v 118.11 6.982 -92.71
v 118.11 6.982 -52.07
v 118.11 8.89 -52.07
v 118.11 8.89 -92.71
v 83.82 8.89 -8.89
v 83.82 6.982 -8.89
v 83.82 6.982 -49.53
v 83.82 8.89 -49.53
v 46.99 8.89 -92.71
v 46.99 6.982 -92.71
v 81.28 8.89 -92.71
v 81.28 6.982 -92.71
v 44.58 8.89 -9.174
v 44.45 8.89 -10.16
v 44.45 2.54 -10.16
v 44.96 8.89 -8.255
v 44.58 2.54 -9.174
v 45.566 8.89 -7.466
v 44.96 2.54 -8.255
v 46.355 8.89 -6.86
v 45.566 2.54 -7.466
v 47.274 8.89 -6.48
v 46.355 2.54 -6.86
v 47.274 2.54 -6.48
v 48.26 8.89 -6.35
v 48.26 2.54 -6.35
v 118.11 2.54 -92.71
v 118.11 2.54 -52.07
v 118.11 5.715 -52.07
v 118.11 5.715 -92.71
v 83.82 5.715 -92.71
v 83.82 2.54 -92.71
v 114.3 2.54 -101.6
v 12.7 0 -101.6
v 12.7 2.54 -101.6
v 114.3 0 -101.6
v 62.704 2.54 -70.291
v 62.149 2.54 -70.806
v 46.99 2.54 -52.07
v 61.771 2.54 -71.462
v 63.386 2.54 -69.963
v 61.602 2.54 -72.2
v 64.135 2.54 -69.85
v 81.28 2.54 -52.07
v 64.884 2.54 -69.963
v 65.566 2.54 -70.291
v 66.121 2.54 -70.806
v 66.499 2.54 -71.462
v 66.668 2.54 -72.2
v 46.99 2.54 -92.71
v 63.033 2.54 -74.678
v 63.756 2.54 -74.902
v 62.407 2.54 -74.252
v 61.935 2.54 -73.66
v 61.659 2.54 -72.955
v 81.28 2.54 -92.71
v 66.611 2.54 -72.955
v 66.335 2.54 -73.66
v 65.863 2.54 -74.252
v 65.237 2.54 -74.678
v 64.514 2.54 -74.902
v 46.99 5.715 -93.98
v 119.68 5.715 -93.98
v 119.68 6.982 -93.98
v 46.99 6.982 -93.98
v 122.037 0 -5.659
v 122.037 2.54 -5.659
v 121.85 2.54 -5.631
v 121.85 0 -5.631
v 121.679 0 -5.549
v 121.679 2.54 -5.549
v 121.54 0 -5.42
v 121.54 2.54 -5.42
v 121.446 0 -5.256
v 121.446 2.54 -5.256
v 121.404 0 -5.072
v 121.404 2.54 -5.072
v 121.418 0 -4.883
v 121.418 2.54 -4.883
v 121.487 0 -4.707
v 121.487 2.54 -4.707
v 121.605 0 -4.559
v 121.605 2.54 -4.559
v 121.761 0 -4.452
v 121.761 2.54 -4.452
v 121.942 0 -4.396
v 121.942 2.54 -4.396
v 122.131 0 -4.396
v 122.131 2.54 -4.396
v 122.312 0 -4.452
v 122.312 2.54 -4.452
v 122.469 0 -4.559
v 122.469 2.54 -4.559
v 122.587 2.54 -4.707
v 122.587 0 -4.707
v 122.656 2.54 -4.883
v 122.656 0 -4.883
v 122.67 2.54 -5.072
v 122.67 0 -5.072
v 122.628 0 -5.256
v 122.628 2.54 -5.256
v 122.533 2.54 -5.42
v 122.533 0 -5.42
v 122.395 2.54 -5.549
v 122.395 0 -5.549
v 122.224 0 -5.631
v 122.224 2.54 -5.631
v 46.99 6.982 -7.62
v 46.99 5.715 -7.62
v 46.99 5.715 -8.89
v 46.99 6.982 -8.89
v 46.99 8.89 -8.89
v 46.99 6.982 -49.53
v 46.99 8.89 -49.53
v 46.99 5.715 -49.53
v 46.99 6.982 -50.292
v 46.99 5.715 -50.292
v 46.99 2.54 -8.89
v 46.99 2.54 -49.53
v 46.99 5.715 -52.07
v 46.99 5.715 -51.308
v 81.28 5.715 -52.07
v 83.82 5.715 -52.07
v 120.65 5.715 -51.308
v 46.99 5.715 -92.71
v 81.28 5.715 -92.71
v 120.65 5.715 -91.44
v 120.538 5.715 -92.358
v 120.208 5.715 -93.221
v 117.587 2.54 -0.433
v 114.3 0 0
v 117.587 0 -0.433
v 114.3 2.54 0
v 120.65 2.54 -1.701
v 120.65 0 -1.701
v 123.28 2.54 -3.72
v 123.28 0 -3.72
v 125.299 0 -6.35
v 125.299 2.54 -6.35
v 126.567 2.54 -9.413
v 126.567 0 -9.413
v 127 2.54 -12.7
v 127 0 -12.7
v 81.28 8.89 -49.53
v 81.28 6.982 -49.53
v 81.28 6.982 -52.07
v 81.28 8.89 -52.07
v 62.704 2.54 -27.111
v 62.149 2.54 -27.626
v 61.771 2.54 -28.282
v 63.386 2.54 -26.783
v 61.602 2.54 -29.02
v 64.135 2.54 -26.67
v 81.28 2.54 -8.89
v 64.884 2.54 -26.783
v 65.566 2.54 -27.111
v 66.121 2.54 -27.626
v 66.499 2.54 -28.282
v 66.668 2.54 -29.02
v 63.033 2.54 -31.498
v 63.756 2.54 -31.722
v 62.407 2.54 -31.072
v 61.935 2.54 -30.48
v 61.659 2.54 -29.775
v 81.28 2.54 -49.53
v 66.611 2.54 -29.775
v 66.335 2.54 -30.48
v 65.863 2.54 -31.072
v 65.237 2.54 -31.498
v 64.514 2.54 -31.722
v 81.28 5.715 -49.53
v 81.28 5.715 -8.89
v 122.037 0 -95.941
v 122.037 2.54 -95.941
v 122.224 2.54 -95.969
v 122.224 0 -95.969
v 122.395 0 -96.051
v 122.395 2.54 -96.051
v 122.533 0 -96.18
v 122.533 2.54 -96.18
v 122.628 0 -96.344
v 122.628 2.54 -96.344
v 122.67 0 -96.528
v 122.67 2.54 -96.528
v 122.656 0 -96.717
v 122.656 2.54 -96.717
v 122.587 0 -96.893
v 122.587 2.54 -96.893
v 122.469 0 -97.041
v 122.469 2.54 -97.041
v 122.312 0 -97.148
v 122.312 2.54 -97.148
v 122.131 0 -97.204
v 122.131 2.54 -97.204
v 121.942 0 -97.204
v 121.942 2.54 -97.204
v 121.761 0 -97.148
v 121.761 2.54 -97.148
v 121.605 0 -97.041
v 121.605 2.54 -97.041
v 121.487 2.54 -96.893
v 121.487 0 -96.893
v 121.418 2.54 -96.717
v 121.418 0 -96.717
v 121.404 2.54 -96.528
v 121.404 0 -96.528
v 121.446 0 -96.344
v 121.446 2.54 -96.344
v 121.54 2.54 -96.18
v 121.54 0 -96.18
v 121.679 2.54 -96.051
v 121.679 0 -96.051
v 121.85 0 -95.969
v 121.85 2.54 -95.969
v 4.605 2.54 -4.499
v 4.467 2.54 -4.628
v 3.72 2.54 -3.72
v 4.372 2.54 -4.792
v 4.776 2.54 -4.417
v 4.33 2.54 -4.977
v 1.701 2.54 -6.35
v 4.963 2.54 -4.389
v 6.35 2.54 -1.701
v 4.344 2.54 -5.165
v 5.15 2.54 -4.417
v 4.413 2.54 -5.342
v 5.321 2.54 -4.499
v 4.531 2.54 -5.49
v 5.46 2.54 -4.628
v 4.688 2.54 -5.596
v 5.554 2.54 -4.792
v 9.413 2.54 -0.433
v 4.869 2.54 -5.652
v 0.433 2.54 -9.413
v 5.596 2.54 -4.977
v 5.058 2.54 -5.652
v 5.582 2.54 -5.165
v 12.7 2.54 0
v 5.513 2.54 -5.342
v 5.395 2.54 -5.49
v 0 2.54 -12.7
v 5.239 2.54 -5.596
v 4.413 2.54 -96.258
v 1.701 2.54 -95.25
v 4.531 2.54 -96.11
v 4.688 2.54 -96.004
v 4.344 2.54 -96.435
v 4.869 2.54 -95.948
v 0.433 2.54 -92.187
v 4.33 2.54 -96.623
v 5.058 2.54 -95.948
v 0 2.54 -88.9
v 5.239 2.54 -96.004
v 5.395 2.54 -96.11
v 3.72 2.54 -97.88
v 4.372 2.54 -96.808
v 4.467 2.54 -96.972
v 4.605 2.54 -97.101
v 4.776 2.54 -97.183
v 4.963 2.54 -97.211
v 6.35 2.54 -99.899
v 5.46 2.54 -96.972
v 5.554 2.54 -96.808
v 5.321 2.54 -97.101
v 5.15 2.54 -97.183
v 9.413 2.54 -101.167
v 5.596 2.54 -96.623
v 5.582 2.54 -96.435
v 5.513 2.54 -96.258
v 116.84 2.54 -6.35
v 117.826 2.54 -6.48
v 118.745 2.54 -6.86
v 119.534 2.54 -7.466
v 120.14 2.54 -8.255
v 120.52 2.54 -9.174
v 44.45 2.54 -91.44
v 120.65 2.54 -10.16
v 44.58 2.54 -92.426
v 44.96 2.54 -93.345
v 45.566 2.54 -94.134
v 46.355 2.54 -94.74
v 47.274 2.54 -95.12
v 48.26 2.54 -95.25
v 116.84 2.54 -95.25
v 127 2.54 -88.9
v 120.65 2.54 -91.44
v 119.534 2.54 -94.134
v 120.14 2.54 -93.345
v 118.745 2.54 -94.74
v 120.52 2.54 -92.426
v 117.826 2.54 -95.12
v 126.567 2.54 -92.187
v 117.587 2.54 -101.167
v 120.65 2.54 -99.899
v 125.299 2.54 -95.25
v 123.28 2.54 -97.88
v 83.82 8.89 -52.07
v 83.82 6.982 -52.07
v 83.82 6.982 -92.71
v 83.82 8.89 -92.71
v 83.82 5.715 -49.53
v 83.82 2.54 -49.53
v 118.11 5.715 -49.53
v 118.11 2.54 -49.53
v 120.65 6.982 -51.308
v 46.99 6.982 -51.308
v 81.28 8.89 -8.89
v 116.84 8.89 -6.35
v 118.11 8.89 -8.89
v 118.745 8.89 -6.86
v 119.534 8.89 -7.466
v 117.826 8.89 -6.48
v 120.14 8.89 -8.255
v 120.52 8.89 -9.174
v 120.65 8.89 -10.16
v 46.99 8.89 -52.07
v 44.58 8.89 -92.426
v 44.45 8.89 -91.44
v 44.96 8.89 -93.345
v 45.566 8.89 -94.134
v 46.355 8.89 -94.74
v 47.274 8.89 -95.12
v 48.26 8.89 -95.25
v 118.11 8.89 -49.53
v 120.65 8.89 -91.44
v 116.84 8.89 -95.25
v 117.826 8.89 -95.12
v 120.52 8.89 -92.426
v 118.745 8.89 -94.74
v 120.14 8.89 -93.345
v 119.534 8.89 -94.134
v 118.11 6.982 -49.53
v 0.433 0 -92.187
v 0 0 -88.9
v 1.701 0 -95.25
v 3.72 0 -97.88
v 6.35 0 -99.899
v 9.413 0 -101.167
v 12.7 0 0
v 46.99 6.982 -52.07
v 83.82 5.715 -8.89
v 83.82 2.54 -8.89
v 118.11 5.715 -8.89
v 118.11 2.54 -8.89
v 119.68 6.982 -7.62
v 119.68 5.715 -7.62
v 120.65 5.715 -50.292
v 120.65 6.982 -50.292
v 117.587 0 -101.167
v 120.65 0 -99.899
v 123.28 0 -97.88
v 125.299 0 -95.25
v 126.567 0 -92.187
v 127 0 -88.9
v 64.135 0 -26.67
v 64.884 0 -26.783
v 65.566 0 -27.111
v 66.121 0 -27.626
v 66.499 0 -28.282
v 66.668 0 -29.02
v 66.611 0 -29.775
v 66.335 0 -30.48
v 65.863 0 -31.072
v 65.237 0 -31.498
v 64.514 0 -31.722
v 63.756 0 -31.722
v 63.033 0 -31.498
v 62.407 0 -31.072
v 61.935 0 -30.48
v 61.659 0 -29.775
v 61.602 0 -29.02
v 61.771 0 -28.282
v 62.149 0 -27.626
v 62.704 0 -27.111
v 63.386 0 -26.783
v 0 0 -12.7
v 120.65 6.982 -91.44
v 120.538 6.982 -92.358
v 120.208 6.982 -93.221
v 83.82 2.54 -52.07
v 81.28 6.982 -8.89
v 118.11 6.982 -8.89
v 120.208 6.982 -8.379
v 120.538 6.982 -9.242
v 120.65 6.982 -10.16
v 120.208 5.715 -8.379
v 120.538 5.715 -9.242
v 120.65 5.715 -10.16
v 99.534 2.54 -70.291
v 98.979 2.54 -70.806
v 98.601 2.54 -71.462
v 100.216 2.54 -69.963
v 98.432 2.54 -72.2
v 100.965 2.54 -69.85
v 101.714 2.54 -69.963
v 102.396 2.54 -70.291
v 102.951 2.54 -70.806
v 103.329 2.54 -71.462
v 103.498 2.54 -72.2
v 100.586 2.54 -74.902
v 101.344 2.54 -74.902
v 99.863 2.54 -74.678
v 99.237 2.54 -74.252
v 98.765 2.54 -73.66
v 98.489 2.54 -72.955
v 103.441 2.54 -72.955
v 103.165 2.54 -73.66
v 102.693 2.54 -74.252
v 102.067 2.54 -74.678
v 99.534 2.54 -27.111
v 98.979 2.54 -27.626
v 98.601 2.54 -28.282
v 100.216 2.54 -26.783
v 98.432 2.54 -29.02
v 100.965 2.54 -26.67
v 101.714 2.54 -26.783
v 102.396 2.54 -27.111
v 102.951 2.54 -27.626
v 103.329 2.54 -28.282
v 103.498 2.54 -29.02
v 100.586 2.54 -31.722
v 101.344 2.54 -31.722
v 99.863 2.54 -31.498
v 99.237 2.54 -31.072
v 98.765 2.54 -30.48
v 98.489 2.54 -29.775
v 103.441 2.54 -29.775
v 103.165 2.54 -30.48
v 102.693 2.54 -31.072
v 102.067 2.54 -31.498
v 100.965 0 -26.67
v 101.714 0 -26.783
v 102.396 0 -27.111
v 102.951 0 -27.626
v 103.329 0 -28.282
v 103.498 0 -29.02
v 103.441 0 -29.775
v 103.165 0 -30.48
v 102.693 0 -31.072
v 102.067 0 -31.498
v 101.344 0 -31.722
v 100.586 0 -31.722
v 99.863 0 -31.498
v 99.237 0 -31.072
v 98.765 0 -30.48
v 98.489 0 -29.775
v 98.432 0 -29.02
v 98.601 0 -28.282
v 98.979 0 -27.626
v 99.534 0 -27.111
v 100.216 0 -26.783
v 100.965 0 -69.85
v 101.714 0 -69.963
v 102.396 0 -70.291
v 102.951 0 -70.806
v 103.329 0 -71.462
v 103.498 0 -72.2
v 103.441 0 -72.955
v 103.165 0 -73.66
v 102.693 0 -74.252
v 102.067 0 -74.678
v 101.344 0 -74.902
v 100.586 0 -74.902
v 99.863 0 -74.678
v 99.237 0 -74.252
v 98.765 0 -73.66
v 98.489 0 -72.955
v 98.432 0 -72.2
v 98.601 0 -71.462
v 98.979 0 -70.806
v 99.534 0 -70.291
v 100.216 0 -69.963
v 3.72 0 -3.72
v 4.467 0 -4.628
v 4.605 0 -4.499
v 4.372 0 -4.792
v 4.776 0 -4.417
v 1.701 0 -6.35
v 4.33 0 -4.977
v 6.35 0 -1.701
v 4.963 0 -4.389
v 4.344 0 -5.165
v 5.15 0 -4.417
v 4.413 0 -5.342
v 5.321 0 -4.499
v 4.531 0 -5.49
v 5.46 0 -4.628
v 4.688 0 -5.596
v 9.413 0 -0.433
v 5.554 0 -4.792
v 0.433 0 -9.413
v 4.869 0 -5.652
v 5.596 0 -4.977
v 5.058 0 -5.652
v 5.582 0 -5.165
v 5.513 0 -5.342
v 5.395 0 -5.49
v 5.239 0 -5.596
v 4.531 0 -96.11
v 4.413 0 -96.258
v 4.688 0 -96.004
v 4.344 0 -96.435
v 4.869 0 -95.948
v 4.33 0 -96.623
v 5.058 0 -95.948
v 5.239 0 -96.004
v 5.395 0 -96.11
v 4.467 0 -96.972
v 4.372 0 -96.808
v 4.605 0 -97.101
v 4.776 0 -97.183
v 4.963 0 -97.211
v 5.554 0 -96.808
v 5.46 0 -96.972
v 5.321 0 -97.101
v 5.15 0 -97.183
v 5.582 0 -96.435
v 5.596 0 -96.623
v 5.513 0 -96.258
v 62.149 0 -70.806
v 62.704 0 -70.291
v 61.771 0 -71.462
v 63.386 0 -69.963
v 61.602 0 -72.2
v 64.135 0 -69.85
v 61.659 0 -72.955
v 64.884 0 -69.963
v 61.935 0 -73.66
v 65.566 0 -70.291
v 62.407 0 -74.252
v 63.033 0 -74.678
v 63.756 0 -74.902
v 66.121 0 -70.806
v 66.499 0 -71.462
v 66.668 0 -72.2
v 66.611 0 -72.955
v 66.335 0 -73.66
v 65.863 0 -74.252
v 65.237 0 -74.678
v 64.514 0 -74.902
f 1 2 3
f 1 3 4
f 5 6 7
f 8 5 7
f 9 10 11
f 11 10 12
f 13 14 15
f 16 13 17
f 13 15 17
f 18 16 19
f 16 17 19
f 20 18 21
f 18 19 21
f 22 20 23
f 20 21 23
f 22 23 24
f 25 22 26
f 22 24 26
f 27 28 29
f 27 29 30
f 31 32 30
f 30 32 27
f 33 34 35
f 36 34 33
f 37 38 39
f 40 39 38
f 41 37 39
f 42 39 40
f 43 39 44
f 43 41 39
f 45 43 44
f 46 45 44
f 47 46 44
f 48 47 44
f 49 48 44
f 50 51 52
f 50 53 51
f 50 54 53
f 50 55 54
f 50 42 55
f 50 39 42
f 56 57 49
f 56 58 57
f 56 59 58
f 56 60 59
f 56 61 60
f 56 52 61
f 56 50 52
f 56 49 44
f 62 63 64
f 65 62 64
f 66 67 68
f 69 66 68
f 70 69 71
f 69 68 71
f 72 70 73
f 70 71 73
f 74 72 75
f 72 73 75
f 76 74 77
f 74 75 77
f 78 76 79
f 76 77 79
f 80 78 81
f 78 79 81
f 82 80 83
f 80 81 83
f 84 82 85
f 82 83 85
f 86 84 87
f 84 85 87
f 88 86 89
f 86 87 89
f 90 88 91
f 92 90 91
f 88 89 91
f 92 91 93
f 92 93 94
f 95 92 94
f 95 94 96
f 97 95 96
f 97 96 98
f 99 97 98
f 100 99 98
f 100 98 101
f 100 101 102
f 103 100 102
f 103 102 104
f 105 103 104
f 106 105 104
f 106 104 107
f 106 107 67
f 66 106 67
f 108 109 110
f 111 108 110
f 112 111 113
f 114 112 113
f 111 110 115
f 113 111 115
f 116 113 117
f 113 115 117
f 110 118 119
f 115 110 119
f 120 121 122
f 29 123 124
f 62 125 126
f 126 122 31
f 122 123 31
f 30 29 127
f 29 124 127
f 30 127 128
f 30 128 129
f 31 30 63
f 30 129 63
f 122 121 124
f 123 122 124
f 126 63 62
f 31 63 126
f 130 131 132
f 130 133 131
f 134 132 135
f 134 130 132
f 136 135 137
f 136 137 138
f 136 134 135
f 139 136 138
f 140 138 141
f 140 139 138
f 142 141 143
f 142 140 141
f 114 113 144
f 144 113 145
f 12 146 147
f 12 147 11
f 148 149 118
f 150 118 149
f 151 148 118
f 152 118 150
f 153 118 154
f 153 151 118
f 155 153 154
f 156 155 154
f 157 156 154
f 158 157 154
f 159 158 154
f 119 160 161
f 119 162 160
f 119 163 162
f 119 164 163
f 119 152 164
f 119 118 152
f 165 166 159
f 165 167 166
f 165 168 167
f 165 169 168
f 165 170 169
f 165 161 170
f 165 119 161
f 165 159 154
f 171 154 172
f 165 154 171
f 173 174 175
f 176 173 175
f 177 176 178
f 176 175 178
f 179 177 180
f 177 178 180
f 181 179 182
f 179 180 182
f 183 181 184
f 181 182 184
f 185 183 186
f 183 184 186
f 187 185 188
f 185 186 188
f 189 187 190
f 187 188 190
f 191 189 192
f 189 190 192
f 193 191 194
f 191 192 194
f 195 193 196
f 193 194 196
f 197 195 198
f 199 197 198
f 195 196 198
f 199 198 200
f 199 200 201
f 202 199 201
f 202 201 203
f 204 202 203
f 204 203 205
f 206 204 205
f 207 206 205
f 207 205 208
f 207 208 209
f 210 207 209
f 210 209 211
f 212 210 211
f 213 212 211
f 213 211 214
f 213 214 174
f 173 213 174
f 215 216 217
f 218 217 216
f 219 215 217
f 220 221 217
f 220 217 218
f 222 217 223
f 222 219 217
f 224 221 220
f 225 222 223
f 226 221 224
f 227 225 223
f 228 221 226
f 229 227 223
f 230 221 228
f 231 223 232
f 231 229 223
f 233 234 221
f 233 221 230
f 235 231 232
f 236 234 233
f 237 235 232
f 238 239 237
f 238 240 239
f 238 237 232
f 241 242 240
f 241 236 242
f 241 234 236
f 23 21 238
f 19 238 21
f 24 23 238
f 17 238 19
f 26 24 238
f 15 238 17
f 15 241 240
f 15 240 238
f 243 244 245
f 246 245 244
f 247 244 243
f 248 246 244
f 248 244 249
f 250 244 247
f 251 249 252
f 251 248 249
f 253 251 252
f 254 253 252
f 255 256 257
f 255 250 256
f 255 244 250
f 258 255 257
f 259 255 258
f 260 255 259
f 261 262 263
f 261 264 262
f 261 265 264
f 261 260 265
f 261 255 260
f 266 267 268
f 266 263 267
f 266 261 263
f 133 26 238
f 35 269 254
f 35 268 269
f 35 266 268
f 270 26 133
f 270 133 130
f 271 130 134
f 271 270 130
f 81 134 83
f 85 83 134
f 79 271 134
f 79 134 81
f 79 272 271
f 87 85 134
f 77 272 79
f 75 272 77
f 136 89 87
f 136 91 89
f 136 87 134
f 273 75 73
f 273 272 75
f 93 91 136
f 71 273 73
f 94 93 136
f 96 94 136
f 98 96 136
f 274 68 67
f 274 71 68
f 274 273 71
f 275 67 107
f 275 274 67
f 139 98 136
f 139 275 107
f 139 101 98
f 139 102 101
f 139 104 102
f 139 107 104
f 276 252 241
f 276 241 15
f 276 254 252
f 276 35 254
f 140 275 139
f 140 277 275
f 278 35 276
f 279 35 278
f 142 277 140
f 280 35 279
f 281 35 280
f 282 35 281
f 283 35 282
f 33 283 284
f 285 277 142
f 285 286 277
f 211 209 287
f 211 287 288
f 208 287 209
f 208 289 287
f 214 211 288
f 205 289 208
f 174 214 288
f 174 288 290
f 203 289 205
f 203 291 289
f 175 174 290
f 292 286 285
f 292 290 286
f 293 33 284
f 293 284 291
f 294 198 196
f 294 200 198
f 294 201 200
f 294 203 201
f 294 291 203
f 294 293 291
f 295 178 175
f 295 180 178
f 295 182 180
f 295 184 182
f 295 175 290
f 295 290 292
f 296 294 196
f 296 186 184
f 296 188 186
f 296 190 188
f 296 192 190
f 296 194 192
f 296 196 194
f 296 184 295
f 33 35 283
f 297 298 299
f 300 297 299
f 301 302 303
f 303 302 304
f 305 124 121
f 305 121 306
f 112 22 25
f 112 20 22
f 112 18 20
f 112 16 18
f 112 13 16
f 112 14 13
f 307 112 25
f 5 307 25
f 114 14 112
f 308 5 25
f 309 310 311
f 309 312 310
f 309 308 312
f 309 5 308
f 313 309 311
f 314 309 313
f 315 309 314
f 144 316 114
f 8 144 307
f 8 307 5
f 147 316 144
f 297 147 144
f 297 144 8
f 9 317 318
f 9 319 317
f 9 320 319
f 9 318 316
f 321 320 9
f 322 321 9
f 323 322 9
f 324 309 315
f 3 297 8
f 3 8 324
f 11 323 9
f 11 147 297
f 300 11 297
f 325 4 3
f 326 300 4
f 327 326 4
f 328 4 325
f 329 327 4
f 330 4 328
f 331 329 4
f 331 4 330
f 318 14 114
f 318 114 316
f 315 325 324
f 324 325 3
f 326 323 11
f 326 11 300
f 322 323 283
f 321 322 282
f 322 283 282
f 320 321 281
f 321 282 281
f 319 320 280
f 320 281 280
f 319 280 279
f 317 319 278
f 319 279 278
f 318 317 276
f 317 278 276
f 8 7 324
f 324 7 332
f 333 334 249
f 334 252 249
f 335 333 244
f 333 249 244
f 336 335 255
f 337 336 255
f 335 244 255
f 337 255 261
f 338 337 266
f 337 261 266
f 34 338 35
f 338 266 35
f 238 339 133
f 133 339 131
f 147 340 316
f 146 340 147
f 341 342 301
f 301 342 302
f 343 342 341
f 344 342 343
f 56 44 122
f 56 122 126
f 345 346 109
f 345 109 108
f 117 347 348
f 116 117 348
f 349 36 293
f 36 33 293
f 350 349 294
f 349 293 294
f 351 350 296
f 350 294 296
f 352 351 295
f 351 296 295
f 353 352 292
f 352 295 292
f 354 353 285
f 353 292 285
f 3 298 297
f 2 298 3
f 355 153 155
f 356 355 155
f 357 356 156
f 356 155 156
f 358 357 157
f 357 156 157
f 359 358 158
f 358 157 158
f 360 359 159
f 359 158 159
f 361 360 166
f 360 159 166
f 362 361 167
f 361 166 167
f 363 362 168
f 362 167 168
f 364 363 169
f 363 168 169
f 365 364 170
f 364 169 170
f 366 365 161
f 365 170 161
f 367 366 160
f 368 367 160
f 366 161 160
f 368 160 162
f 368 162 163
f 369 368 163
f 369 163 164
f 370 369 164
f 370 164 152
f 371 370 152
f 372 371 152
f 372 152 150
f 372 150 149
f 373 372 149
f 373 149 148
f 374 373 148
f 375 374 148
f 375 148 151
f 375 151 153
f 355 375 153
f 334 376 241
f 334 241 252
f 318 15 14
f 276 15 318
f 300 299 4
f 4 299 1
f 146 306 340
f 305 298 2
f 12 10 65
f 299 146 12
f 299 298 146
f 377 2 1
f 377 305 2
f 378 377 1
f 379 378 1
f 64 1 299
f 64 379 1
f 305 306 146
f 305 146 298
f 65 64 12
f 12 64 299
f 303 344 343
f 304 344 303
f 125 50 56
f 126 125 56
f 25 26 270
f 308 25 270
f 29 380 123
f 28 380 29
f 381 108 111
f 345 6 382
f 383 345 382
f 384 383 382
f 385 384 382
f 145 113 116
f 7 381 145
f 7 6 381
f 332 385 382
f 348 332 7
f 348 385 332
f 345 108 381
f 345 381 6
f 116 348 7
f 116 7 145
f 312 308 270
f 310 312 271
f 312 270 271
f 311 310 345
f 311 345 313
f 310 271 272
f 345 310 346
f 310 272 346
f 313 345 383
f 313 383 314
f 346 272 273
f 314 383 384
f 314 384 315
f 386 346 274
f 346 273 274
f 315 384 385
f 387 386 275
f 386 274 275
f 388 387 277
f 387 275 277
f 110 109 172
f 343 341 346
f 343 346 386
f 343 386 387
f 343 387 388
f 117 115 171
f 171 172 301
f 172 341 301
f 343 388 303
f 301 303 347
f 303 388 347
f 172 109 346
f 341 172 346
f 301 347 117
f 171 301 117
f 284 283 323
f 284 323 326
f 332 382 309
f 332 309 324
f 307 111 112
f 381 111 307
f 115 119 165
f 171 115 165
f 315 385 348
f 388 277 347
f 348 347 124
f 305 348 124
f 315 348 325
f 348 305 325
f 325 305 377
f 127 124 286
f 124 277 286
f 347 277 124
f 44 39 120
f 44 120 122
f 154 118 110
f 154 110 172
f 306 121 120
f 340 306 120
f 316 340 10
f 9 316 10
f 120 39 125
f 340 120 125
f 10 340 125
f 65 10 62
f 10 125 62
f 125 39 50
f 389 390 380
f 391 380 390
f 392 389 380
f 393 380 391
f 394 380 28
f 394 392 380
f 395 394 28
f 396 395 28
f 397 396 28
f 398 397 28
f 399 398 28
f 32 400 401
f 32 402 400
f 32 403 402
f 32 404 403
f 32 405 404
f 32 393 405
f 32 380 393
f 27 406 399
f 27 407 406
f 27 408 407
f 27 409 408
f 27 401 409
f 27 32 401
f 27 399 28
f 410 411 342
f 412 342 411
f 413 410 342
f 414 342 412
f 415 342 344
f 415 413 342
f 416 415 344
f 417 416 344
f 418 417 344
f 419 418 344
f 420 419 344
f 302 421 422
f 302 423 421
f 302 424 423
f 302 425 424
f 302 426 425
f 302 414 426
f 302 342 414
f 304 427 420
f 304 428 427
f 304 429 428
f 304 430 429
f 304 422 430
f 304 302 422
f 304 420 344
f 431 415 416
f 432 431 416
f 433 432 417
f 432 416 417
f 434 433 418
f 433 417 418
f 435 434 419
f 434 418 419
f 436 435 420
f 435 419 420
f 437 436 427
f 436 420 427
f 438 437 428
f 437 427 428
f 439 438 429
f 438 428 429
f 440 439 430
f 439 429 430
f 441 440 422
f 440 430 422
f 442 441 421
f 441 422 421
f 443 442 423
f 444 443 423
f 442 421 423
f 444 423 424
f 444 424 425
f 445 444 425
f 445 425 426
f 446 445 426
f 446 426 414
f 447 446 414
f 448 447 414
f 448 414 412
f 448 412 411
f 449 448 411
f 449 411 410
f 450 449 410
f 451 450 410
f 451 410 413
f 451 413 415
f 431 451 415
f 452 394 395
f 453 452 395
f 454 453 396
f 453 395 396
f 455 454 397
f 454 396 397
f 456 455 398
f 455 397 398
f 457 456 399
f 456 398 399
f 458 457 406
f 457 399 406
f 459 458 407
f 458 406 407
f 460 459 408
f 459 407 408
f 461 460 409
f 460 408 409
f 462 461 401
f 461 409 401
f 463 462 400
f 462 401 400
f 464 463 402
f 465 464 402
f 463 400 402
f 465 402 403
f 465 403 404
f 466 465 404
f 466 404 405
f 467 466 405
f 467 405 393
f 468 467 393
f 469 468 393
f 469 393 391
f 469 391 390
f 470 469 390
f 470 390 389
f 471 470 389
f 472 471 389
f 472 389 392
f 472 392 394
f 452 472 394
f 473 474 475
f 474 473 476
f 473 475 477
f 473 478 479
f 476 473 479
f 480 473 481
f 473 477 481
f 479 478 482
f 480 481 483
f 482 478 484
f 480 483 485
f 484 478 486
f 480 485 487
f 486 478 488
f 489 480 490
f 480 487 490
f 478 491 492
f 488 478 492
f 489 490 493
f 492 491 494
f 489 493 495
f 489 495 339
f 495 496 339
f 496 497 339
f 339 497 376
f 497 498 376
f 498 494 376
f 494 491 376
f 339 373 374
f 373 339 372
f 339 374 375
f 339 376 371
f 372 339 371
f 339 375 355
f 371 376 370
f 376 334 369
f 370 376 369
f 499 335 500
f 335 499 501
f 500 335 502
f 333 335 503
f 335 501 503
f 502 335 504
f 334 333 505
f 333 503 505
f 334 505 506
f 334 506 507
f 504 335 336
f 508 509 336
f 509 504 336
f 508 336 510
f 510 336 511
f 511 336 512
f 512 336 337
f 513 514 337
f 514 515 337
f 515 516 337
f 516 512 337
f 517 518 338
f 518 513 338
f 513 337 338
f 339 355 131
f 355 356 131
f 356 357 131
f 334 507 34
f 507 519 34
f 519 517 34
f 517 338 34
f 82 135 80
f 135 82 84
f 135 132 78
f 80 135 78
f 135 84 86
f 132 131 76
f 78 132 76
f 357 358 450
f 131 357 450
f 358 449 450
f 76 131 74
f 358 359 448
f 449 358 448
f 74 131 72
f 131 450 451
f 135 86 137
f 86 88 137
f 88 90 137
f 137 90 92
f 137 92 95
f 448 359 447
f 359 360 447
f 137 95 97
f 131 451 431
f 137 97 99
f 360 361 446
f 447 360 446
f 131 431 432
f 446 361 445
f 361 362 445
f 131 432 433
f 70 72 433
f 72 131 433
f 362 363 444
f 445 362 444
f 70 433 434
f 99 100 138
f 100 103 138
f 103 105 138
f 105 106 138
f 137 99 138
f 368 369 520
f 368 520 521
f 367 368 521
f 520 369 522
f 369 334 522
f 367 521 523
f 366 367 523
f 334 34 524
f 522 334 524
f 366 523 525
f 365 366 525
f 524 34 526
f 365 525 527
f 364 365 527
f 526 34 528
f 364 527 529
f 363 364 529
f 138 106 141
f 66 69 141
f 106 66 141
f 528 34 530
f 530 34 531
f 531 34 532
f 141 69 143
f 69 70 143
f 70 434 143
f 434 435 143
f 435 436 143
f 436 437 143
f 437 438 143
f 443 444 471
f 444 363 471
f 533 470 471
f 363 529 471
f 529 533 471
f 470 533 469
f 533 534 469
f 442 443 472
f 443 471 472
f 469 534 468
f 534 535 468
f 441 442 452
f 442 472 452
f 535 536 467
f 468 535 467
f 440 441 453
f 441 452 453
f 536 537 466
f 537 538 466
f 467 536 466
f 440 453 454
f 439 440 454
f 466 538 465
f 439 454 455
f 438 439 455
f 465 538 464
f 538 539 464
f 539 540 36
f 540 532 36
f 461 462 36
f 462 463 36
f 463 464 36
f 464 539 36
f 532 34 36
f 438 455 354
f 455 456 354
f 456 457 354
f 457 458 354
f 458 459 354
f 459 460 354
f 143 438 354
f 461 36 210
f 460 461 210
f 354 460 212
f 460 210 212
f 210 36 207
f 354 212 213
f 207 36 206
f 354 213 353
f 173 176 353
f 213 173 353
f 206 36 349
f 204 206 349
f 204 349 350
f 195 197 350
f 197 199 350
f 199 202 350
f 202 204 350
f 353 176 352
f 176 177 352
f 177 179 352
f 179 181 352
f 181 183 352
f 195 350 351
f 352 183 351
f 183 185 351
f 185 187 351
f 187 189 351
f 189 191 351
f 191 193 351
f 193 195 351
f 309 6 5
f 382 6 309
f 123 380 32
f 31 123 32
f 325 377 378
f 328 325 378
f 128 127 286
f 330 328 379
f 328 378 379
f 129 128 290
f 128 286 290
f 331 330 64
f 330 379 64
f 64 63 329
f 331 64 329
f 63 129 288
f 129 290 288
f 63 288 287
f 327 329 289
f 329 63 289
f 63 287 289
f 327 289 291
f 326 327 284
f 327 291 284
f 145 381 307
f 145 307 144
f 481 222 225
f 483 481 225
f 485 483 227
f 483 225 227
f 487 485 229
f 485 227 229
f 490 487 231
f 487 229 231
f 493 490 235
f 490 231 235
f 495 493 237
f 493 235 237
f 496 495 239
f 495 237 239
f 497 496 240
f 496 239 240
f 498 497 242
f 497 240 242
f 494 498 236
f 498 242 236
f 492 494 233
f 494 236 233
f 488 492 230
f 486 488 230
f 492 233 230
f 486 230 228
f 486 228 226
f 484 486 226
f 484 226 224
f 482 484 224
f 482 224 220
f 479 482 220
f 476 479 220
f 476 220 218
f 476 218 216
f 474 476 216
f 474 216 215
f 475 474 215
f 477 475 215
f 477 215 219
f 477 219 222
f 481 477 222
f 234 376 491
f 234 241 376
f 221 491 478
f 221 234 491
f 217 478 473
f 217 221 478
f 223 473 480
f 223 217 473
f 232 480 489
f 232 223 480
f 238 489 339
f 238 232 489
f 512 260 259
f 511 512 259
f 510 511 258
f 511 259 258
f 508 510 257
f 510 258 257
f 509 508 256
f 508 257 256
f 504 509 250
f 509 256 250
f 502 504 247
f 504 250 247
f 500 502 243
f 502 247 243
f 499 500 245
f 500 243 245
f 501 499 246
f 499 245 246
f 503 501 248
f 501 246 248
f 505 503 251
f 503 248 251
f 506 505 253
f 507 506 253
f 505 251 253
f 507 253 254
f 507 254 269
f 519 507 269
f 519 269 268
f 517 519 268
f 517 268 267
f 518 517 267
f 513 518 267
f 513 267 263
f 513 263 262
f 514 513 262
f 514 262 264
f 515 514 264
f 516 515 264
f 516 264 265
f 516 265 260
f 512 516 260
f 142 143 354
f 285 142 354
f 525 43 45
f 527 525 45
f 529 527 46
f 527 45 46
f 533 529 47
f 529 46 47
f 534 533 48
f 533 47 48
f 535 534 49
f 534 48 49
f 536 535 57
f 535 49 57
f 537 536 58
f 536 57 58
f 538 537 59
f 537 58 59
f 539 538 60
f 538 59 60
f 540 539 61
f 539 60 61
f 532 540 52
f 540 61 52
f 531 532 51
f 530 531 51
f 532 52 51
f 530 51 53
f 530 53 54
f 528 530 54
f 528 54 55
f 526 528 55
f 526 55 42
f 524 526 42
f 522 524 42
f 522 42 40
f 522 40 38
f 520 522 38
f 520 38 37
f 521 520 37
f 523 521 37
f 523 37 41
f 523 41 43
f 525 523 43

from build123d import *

# Parameters (mm, degrees)
SKETCH1_W           = 127
SKETCH1_H           = 101.6
BOSS_EXTRUDE1_DEPTH = 2.54
SKETCH2_W           = 76.2
SKETCH2_H           = 88.9
SKETCH2_W_2         = 34.29
SKETCH2_H_2         = 40.64
BOSS_EXTRUDE2_DEPTH = 6.35
SKETCH3_R           = 2.54
CUT_EXTRUDE1_DEPTH  = 163.763271348
CUT_EXTRUDE2_REACH  = 159.981
SKETCH4_W           = 42.672
SKETCH4_H           = 1.267041817
FILLET1_R           = 3.81
FILLET2_R           = 12.7
SKETCH5_R           = 0.635
CUT_EXTRUDE3_DEPTH  = 163.763271348


with BuildPart() as part:
    # Sketch1 → Boss-Extrude1 (new body)
    with BuildSketch(Plane(origin=(0, 0, 0), x_dir=(1, 0, 0), z_dir=(0, 1, 0))):
        with Locations((63.5, 50.8)):
            Rectangle(SKETCH1_W, SKETCH1_H)
    extrude(amount=BOSS_EXTRUDE1_DEPTH)

    # Sketch2 → Boss-Extrude2 (add)
    with BuildSketch(Plane(origin=(0, 2.54, 0), x_dir=(1, 0, 0), z_dir=(0, 1, 0))):
        with Locations((82.55, 50.8)):
            Rectangle(SKETCH2_W, SKETCH2_H)
        with Locations((64.135, 72.39)):
            Rectangle(SKETCH2_W_2, SKETCH2_H_2, mode=Mode.SUBTRACT)
        with Locations((64.135, 29.21)):
            Rectangle(SKETCH2_W_2, SKETCH2_H_2, mode=Mode.SUBTRACT)
        with Locations((100.965, 29.21)):
            Rectangle(SKETCH2_W_2, SKETCH2_H_2, mode=Mode.SUBTRACT)
        with Locations((100.965, 72.39)):
            Rectangle(SKETCH2_W_2, SKETCH2_H_2, mode=Mode.SUBTRACT)
    extrude(amount=BOSS_EXTRUDE2_DEPTH)

    # Sketch3 → Cut-Extrude1 (cut, through all)
    with BuildSketch(Plane(origin=(0, 2.54, 0), x_dir=(1, 0, 0), z_dir=(0, 1, 0))):
        with Locations(Location((64.135, 72.39, 0), (0, 0, 270))):
            Circle(SKETCH3_R)
        with Locations(Location((100.965, 72.39, 0), (0, 0, 270))):
            Circle(SKETCH3_R)
        with Locations(Location((64.135, 29.21, 0), (0, 0, 270))):
            Circle(SKETCH3_R)
        with Locations(Location((100.965, 29.21, 0), (0, 0, 270))):
            Circle(SKETCH3_R)
    extrude(amount=-CUT_EXTRUDE1_DEPTH, mode=Mode.SUBTRACT)

    # Cut-Extrude2: up to this face of the body (flat: up to its plane)
    cut_extrude2_end = Plane(part.part.faces().sort_by_distance((46.99, 5.715, -29.21))[0])
    # Sketch4 → Cut-Extrude2 (cut, up to the picked face)
    with BuildSketch(Plane(origin=(120.65, 0, 0), x_dir=(0, 0, -1), z_dir=(1, 0, 0)), mode=Mode.PRIVATE) as cut_extrude2_sk1:
        with Locations((72.644, 6.348520909)):
            Rectangle(SKETCH4_W, SKETCH4_H)
    cut_extrude2_tool1 = split(extrude(cut_extrude2_sk1.sketch, amount=-CUT_EXTRUDE2_REACH, mode=Mode.PRIVATE), bisect_by=cut_extrude2_end, keep=Keep.BOTH, mode=Mode.PRIVATE)
    # Sketch4 → Cut-Extrude2 (cut, up to the picked face)
    with BuildSketch(Plane(origin=(120.65, 0, 0), x_dir=(0, 0, -1), z_dir=(1, 0, 0)), mode=Mode.PRIVATE) as cut_extrude2_sk2:
        with Locations((28.956, 6.348520909)):
            Rectangle(SKETCH4_W, SKETCH4_H)
    cut_extrude2_tool2 = split(extrude(cut_extrude2_sk2.sketch, amount=-CUT_EXTRUDE2_REACH, mode=Mode.PRIVATE), bisect_by=cut_extrude2_end, keep=Keep.BOTH, mode=Mode.PRIVATE)
    add(cut_extrude2_tool1.solids().sort_by(Axis((120.65, 6.348521, -72.644), (-1, 0, 0)))[0], mode=Mode.SUBTRACT)
    add(cut_extrude2_tool2.solids().sort_by(Axis((120.65, 6.348521, -28.956), (-1, 0, 0)))[0], mode=Mode.SUBTRACT)

    # Fillet1
    # the kernel refuses this fillet: 3.81 mm, written as the material it takes off along each edge
    with BuildSketch(Plane(origin=(120.65, 2.54, -95.25), x_dir=(0, 0, 1), z_dir=(0, 1, 0)), Plane(origin=(120.65, 2.54, -6.35), x_dir=(-1, 0, 0), z_dir=(0, 1, 0)), Plane(origin=(44.45, 2.54, -6.35), x_dir=(0, 0, -1), z_dir=(0, 1, 0))) as fillet1_piece_1:
        with BuildLine():
            CenterArc((FILLET1_R, -FILLET1_R), FILLET1_R, 90, 90)
            Line((0, -FILLET1_R), (0, 0))
            Line((0, 0), (FILLET1_R, 0))
        make_face()
    extrude(amount=15.875, mode=Mode.SUBTRACT)
    with BuildSketch(Plane(origin=(44.45, 2.54, -95.25), x_dir=(0, 0, 1), z_dir=(0, 1, 0))) as fillet1_piece_2:
        with BuildLine():
            CenterArc((FILLET1_R, FILLET1_R), FILLET1_R, 180, 90)
            Line((0, FILLET1_R), (0, 0))
            Line((0, 0), (FILLET1_R, 0))
        make_face()
    extrude(amount=15.875, mode=Mode.SUBTRACT)

    # Fillet2
    fillet2_edges = [part.edges().sort_by_distance(p)[0] for p in [
        (0, 1.27, -101.6),
        (127, 1.27, -101.6),
        (127, 1.27, 0),
        (0, 1.27, 0),
    ]]
    fillet(fillet2_edges, radius=FILLET2_R)

    # Sketch5 → Cut-Extrude3 (cut, through all)
    with BuildSketch(Plane(origin=(0, 2.54, 0), x_dir=(1, 0, 0), z_dir=(0, 1, 0))):
        with Locations(Location((4.963162708, 5.024067494, 0), (0, 0, 270))):
            Circle(SKETCH5_R)
        with Locations(Location((122.036837292, 5.024067494, 0), (0, 0, 90))):
            Circle(SKETCH5_R)
        with Locations(Location((122.036837292, 96.575932506, 0), (0, 0, 270))):
            Circle(SKETCH5_R)
        with Locations(Location((4.963162708, 96.575932506, 0), (0, 0, 90))):
            Circle(SKETCH5_R)
    extrude(amount=-CUT_EXTRUDE3_DEPTH, mode=Mode.SUBTRACT)


solid = part.part
